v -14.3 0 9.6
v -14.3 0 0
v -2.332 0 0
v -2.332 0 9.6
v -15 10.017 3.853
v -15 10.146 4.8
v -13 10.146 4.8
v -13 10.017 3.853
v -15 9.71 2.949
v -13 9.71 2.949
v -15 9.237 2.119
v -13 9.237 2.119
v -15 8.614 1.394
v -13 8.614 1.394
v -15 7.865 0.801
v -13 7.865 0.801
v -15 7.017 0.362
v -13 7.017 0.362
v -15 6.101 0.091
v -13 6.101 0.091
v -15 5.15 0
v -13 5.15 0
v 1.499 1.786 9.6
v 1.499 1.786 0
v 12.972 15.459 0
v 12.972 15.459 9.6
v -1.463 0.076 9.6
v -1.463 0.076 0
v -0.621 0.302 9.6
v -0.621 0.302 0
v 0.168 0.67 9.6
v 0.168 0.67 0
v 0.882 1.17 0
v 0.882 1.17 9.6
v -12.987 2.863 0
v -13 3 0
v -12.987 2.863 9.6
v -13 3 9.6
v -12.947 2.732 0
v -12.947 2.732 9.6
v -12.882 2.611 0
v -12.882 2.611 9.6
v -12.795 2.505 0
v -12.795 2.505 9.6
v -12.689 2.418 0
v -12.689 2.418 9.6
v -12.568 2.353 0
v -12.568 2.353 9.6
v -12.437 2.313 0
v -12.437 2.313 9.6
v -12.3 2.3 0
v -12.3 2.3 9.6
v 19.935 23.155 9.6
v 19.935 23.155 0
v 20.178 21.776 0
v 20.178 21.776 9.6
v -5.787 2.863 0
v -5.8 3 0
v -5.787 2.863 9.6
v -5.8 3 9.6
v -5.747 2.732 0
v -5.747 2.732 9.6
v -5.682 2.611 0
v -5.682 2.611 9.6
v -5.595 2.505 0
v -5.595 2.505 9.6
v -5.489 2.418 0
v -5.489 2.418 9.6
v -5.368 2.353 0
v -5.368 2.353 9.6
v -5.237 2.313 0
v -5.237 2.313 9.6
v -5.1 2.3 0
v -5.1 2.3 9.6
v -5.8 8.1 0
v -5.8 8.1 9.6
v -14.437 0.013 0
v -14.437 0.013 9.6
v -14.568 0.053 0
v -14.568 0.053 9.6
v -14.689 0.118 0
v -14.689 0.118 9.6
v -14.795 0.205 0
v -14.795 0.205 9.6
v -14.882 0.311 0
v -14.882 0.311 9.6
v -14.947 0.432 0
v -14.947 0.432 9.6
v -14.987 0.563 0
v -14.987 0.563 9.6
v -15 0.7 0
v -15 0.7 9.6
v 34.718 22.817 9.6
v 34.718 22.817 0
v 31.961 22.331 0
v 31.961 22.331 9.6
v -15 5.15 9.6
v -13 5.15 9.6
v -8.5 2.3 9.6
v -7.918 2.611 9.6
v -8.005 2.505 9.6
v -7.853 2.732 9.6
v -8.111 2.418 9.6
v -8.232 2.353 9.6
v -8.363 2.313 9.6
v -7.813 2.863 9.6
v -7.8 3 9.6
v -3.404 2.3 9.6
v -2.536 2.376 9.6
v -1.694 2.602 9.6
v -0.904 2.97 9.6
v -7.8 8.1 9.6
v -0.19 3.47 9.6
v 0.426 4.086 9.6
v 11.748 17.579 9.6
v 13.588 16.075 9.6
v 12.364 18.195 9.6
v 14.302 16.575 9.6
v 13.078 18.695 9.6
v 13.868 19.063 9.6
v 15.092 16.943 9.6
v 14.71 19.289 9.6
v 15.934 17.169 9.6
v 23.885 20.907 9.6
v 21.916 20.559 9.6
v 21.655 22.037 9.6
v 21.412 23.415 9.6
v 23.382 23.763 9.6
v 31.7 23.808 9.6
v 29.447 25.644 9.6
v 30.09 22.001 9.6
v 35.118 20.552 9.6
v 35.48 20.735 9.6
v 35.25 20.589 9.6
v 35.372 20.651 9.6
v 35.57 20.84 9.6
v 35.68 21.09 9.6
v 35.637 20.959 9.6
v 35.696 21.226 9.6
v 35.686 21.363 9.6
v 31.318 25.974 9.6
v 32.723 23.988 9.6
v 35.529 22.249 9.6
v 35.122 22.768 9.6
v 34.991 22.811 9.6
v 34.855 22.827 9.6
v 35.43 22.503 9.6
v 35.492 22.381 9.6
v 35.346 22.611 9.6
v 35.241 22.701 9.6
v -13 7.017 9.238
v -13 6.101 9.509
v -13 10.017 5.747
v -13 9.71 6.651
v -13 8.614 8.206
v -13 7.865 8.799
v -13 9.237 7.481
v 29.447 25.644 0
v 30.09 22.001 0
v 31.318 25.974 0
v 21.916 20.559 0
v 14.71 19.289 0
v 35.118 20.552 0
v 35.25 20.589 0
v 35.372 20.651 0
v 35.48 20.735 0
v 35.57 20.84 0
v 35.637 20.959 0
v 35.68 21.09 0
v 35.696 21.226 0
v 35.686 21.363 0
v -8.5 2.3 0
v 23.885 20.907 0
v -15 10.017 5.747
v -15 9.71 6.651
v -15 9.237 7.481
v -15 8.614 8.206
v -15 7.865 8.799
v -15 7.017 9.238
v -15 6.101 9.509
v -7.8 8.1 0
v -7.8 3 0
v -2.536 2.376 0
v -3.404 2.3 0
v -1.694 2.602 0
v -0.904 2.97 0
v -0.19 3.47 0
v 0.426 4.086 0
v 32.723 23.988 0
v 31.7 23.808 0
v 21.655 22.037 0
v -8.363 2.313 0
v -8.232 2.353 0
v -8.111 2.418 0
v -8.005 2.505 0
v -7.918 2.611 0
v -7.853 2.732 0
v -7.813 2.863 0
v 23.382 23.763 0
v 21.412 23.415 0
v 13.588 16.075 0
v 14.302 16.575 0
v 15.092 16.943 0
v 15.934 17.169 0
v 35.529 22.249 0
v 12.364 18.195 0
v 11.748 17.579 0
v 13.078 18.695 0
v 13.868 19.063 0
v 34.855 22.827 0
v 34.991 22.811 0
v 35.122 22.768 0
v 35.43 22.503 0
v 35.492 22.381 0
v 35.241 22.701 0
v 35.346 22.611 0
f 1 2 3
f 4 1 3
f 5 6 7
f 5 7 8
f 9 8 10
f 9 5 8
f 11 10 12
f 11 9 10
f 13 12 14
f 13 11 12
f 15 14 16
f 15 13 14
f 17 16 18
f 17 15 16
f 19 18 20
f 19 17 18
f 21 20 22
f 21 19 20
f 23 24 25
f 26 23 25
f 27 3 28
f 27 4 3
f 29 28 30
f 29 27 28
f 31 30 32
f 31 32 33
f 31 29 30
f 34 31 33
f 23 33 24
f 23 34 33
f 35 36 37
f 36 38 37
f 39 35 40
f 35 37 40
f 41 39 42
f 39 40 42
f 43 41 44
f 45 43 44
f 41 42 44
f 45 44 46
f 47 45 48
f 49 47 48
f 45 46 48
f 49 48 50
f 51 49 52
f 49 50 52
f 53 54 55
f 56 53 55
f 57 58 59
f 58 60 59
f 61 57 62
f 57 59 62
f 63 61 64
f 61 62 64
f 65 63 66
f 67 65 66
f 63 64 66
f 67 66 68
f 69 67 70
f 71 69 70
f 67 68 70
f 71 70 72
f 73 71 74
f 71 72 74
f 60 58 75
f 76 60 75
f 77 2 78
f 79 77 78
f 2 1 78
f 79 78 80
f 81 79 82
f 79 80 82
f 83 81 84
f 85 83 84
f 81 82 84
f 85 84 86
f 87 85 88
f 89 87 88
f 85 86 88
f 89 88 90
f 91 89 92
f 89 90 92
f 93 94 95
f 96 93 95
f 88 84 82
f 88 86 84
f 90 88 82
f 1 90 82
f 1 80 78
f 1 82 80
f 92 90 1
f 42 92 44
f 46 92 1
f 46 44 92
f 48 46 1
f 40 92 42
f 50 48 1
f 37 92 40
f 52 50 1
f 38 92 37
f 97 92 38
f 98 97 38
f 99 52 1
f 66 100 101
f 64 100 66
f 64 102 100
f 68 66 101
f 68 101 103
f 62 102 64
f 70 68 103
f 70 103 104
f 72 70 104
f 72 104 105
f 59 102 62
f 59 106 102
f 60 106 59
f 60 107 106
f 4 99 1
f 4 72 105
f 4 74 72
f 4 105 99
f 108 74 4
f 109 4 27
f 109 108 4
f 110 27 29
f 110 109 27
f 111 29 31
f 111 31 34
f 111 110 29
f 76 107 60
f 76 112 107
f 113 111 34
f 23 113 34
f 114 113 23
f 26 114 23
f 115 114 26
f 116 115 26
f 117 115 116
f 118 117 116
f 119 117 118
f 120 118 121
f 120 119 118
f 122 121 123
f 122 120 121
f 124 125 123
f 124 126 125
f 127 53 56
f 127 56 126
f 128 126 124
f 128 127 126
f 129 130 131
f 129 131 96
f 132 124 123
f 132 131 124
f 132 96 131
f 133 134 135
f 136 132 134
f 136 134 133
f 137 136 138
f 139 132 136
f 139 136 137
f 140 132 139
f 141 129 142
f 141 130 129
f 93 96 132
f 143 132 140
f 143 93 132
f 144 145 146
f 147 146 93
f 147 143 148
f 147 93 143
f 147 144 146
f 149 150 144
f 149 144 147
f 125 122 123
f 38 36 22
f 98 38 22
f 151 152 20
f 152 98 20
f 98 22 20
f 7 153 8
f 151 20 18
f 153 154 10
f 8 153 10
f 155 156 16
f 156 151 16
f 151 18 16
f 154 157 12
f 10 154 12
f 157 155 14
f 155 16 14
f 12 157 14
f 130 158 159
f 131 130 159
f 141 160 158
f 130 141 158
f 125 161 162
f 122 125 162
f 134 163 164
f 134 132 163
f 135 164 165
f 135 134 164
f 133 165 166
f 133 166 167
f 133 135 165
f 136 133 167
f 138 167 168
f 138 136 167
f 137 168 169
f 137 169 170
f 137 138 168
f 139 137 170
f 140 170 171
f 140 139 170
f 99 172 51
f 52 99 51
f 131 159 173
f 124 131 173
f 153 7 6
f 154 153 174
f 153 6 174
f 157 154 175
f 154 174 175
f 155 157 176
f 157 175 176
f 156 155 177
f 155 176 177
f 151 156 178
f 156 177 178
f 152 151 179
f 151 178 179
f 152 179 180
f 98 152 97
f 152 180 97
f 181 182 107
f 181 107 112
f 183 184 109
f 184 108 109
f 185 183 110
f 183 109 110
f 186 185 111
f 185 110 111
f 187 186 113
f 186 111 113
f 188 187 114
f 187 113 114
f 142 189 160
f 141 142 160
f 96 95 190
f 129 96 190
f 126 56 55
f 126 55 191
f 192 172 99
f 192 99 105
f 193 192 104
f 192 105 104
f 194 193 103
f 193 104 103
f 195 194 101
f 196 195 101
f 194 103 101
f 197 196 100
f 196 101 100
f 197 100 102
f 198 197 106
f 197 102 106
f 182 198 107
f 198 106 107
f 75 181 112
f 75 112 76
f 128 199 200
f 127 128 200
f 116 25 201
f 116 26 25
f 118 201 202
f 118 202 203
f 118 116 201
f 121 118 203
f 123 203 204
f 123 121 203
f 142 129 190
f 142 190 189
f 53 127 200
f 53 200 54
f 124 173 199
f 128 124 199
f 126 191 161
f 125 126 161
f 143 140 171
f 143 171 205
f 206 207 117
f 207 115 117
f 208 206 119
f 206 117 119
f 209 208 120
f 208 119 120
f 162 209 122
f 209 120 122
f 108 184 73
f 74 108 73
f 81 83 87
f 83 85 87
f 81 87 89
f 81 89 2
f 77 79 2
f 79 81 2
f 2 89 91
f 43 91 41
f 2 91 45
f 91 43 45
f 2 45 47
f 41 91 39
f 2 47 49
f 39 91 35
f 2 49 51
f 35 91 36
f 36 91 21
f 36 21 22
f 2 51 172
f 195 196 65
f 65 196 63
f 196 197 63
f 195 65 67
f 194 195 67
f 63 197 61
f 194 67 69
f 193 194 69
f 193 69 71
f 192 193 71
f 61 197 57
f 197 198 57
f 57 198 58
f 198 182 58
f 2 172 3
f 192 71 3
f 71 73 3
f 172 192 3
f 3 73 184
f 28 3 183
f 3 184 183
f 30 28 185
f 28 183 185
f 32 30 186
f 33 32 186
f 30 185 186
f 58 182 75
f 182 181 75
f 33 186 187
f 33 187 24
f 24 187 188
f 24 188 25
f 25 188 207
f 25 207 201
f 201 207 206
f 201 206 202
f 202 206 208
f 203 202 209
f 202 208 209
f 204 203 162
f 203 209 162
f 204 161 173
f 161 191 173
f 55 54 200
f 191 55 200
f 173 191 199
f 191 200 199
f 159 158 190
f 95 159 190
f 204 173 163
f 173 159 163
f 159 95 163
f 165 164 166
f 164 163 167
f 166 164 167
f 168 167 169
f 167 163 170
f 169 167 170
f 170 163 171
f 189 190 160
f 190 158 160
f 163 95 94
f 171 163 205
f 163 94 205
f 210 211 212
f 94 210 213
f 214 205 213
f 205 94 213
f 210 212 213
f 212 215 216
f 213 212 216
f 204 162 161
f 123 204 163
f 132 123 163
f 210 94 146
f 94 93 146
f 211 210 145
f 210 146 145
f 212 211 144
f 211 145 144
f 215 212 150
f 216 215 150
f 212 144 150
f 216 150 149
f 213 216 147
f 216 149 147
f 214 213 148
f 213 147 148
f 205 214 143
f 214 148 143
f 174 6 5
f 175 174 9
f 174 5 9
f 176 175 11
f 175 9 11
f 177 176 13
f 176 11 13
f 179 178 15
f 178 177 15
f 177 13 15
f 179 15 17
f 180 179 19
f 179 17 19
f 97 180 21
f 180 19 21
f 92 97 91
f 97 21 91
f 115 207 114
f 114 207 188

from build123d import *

# Parameters (mm, degrees)
F0_W        = 2
F0_H        = 7.85
F0_H_2      = 5.8
F1_DEPTH    = 9.6
F2_T1_DEPTH = 14.5
F3_R        = 0.7
F4_R        = 5


# Not quite as in the source:
# - a fillet or chamfer that OpenCascade refuses, or shapes differently, is made with other operations: its cross-section is extruded or revolved along the edge and cut away or added


with BuildPart() as f1:
    # F0 (on Top) → F1 (new body)
    with BuildSketch(Plane.XY):
        Polygon((-15, 0), (0, 0), (14.1413274131, 16.8529777486), (35.8070979794, 20.6732376573), (35.4077071707, 22.9382954892), (31.9608800352, 22.3305268674), (30.0897453045, 22.0005953298), (23.8854564605, 20.9066118105), (21.9158409545, 20.5593154552), (12.9175229748, 18.9726692144), (-1.0725076138, 2.3), (-5.8, 2.3), (-7.8, 2.3), (-13, 2.3), (-15, 2.3), align=None)
        with Locations((-14, 6.225)):
            Rectangle(F0_W, F0_H)
        with Locations((-6.8, 5.2)):
            Rectangle(F0_W, F0_H_2)
        Polygon((30.0897453045, 22.0005953298), (31.9608800352, 22.3305268674), (31.7004077687, 23.8077384969), (31.3183817778, 25.9743155535), (29.4472470471, 25.644384016), align=None)
        Polygon((31.3183817778, 25.9743155535), (31.7004077687, 23.8077384969), (32.7229194348, 23.9880348917), align=None)
        Polygon((21.9158409545, 20.5593154552), (23.8854564605, 20.9066118105), (23.3818767453, 23.7625542943), (21.4122612392, 23.4152579389), (21.655368688, 22.0365270847), align=None)
        Polygon((20.1781570585, 21.7760548182), (21.655368688, 22.0365270847), (21.4122612392, 23.4152579389), (19.9350496097, 23.1547856724), align=None)
    extrude(amount=F1_DEPTH)

    # F2: fillet of radius 5 on 2 edges, made by hand

    # F2_s2 → F2_t1 (cut)
    with BuildSketch(Plane.YZ.offset(-27.5)):
        with BuildLine():
            ThreePointArc((10.15, 4.6), (8.6855339059, 8.1355339059), (5.15, 9.6))
            Line((5.15, 9.6), (10.15, 9.6))
            Line((10.15, 9.6), (10.15, 4.6))
        make_face()
        with BuildLine():
            ThreePointArc((10.15, 5), (8.6855339059, 1.4644660941), (5.15, 0))
            Line((5.15, 0), (10.15, 0))
            Line((10.15, 0), (10.15, 5))
        make_face()
    extrude(amount=F2_T1_DEPTH, mode=Mode.SUBTRACT)

    # F3
    f3_edges = [f1.edges().sort_by_distance(p)[0] for p in [
        (-13, 2.3, 4.8),
        (-7.8, 2.3, 4.8),
        (-5.8, 2.3, 4.8),
        (-15, 0, 4.8),
        (35.407707, 22.938295, 4.8),
        (35.807098, 20.673238, 4.8),
    ]]
    fillet(f3_edges, radius=F3_R)

    # F4
    f4_edges = [f1.edges().sort_by_distance(p)[0] for p in [
        (0, 0, 4.8),
        (12.917523, 18.972669, 4.8),
        (14.141327, 16.852978, 4.8),
        (-1.072508, 2.3, 4.8),
    ]]
    fillet(f4_edges, radius=F4_R)


solid = f1.part
